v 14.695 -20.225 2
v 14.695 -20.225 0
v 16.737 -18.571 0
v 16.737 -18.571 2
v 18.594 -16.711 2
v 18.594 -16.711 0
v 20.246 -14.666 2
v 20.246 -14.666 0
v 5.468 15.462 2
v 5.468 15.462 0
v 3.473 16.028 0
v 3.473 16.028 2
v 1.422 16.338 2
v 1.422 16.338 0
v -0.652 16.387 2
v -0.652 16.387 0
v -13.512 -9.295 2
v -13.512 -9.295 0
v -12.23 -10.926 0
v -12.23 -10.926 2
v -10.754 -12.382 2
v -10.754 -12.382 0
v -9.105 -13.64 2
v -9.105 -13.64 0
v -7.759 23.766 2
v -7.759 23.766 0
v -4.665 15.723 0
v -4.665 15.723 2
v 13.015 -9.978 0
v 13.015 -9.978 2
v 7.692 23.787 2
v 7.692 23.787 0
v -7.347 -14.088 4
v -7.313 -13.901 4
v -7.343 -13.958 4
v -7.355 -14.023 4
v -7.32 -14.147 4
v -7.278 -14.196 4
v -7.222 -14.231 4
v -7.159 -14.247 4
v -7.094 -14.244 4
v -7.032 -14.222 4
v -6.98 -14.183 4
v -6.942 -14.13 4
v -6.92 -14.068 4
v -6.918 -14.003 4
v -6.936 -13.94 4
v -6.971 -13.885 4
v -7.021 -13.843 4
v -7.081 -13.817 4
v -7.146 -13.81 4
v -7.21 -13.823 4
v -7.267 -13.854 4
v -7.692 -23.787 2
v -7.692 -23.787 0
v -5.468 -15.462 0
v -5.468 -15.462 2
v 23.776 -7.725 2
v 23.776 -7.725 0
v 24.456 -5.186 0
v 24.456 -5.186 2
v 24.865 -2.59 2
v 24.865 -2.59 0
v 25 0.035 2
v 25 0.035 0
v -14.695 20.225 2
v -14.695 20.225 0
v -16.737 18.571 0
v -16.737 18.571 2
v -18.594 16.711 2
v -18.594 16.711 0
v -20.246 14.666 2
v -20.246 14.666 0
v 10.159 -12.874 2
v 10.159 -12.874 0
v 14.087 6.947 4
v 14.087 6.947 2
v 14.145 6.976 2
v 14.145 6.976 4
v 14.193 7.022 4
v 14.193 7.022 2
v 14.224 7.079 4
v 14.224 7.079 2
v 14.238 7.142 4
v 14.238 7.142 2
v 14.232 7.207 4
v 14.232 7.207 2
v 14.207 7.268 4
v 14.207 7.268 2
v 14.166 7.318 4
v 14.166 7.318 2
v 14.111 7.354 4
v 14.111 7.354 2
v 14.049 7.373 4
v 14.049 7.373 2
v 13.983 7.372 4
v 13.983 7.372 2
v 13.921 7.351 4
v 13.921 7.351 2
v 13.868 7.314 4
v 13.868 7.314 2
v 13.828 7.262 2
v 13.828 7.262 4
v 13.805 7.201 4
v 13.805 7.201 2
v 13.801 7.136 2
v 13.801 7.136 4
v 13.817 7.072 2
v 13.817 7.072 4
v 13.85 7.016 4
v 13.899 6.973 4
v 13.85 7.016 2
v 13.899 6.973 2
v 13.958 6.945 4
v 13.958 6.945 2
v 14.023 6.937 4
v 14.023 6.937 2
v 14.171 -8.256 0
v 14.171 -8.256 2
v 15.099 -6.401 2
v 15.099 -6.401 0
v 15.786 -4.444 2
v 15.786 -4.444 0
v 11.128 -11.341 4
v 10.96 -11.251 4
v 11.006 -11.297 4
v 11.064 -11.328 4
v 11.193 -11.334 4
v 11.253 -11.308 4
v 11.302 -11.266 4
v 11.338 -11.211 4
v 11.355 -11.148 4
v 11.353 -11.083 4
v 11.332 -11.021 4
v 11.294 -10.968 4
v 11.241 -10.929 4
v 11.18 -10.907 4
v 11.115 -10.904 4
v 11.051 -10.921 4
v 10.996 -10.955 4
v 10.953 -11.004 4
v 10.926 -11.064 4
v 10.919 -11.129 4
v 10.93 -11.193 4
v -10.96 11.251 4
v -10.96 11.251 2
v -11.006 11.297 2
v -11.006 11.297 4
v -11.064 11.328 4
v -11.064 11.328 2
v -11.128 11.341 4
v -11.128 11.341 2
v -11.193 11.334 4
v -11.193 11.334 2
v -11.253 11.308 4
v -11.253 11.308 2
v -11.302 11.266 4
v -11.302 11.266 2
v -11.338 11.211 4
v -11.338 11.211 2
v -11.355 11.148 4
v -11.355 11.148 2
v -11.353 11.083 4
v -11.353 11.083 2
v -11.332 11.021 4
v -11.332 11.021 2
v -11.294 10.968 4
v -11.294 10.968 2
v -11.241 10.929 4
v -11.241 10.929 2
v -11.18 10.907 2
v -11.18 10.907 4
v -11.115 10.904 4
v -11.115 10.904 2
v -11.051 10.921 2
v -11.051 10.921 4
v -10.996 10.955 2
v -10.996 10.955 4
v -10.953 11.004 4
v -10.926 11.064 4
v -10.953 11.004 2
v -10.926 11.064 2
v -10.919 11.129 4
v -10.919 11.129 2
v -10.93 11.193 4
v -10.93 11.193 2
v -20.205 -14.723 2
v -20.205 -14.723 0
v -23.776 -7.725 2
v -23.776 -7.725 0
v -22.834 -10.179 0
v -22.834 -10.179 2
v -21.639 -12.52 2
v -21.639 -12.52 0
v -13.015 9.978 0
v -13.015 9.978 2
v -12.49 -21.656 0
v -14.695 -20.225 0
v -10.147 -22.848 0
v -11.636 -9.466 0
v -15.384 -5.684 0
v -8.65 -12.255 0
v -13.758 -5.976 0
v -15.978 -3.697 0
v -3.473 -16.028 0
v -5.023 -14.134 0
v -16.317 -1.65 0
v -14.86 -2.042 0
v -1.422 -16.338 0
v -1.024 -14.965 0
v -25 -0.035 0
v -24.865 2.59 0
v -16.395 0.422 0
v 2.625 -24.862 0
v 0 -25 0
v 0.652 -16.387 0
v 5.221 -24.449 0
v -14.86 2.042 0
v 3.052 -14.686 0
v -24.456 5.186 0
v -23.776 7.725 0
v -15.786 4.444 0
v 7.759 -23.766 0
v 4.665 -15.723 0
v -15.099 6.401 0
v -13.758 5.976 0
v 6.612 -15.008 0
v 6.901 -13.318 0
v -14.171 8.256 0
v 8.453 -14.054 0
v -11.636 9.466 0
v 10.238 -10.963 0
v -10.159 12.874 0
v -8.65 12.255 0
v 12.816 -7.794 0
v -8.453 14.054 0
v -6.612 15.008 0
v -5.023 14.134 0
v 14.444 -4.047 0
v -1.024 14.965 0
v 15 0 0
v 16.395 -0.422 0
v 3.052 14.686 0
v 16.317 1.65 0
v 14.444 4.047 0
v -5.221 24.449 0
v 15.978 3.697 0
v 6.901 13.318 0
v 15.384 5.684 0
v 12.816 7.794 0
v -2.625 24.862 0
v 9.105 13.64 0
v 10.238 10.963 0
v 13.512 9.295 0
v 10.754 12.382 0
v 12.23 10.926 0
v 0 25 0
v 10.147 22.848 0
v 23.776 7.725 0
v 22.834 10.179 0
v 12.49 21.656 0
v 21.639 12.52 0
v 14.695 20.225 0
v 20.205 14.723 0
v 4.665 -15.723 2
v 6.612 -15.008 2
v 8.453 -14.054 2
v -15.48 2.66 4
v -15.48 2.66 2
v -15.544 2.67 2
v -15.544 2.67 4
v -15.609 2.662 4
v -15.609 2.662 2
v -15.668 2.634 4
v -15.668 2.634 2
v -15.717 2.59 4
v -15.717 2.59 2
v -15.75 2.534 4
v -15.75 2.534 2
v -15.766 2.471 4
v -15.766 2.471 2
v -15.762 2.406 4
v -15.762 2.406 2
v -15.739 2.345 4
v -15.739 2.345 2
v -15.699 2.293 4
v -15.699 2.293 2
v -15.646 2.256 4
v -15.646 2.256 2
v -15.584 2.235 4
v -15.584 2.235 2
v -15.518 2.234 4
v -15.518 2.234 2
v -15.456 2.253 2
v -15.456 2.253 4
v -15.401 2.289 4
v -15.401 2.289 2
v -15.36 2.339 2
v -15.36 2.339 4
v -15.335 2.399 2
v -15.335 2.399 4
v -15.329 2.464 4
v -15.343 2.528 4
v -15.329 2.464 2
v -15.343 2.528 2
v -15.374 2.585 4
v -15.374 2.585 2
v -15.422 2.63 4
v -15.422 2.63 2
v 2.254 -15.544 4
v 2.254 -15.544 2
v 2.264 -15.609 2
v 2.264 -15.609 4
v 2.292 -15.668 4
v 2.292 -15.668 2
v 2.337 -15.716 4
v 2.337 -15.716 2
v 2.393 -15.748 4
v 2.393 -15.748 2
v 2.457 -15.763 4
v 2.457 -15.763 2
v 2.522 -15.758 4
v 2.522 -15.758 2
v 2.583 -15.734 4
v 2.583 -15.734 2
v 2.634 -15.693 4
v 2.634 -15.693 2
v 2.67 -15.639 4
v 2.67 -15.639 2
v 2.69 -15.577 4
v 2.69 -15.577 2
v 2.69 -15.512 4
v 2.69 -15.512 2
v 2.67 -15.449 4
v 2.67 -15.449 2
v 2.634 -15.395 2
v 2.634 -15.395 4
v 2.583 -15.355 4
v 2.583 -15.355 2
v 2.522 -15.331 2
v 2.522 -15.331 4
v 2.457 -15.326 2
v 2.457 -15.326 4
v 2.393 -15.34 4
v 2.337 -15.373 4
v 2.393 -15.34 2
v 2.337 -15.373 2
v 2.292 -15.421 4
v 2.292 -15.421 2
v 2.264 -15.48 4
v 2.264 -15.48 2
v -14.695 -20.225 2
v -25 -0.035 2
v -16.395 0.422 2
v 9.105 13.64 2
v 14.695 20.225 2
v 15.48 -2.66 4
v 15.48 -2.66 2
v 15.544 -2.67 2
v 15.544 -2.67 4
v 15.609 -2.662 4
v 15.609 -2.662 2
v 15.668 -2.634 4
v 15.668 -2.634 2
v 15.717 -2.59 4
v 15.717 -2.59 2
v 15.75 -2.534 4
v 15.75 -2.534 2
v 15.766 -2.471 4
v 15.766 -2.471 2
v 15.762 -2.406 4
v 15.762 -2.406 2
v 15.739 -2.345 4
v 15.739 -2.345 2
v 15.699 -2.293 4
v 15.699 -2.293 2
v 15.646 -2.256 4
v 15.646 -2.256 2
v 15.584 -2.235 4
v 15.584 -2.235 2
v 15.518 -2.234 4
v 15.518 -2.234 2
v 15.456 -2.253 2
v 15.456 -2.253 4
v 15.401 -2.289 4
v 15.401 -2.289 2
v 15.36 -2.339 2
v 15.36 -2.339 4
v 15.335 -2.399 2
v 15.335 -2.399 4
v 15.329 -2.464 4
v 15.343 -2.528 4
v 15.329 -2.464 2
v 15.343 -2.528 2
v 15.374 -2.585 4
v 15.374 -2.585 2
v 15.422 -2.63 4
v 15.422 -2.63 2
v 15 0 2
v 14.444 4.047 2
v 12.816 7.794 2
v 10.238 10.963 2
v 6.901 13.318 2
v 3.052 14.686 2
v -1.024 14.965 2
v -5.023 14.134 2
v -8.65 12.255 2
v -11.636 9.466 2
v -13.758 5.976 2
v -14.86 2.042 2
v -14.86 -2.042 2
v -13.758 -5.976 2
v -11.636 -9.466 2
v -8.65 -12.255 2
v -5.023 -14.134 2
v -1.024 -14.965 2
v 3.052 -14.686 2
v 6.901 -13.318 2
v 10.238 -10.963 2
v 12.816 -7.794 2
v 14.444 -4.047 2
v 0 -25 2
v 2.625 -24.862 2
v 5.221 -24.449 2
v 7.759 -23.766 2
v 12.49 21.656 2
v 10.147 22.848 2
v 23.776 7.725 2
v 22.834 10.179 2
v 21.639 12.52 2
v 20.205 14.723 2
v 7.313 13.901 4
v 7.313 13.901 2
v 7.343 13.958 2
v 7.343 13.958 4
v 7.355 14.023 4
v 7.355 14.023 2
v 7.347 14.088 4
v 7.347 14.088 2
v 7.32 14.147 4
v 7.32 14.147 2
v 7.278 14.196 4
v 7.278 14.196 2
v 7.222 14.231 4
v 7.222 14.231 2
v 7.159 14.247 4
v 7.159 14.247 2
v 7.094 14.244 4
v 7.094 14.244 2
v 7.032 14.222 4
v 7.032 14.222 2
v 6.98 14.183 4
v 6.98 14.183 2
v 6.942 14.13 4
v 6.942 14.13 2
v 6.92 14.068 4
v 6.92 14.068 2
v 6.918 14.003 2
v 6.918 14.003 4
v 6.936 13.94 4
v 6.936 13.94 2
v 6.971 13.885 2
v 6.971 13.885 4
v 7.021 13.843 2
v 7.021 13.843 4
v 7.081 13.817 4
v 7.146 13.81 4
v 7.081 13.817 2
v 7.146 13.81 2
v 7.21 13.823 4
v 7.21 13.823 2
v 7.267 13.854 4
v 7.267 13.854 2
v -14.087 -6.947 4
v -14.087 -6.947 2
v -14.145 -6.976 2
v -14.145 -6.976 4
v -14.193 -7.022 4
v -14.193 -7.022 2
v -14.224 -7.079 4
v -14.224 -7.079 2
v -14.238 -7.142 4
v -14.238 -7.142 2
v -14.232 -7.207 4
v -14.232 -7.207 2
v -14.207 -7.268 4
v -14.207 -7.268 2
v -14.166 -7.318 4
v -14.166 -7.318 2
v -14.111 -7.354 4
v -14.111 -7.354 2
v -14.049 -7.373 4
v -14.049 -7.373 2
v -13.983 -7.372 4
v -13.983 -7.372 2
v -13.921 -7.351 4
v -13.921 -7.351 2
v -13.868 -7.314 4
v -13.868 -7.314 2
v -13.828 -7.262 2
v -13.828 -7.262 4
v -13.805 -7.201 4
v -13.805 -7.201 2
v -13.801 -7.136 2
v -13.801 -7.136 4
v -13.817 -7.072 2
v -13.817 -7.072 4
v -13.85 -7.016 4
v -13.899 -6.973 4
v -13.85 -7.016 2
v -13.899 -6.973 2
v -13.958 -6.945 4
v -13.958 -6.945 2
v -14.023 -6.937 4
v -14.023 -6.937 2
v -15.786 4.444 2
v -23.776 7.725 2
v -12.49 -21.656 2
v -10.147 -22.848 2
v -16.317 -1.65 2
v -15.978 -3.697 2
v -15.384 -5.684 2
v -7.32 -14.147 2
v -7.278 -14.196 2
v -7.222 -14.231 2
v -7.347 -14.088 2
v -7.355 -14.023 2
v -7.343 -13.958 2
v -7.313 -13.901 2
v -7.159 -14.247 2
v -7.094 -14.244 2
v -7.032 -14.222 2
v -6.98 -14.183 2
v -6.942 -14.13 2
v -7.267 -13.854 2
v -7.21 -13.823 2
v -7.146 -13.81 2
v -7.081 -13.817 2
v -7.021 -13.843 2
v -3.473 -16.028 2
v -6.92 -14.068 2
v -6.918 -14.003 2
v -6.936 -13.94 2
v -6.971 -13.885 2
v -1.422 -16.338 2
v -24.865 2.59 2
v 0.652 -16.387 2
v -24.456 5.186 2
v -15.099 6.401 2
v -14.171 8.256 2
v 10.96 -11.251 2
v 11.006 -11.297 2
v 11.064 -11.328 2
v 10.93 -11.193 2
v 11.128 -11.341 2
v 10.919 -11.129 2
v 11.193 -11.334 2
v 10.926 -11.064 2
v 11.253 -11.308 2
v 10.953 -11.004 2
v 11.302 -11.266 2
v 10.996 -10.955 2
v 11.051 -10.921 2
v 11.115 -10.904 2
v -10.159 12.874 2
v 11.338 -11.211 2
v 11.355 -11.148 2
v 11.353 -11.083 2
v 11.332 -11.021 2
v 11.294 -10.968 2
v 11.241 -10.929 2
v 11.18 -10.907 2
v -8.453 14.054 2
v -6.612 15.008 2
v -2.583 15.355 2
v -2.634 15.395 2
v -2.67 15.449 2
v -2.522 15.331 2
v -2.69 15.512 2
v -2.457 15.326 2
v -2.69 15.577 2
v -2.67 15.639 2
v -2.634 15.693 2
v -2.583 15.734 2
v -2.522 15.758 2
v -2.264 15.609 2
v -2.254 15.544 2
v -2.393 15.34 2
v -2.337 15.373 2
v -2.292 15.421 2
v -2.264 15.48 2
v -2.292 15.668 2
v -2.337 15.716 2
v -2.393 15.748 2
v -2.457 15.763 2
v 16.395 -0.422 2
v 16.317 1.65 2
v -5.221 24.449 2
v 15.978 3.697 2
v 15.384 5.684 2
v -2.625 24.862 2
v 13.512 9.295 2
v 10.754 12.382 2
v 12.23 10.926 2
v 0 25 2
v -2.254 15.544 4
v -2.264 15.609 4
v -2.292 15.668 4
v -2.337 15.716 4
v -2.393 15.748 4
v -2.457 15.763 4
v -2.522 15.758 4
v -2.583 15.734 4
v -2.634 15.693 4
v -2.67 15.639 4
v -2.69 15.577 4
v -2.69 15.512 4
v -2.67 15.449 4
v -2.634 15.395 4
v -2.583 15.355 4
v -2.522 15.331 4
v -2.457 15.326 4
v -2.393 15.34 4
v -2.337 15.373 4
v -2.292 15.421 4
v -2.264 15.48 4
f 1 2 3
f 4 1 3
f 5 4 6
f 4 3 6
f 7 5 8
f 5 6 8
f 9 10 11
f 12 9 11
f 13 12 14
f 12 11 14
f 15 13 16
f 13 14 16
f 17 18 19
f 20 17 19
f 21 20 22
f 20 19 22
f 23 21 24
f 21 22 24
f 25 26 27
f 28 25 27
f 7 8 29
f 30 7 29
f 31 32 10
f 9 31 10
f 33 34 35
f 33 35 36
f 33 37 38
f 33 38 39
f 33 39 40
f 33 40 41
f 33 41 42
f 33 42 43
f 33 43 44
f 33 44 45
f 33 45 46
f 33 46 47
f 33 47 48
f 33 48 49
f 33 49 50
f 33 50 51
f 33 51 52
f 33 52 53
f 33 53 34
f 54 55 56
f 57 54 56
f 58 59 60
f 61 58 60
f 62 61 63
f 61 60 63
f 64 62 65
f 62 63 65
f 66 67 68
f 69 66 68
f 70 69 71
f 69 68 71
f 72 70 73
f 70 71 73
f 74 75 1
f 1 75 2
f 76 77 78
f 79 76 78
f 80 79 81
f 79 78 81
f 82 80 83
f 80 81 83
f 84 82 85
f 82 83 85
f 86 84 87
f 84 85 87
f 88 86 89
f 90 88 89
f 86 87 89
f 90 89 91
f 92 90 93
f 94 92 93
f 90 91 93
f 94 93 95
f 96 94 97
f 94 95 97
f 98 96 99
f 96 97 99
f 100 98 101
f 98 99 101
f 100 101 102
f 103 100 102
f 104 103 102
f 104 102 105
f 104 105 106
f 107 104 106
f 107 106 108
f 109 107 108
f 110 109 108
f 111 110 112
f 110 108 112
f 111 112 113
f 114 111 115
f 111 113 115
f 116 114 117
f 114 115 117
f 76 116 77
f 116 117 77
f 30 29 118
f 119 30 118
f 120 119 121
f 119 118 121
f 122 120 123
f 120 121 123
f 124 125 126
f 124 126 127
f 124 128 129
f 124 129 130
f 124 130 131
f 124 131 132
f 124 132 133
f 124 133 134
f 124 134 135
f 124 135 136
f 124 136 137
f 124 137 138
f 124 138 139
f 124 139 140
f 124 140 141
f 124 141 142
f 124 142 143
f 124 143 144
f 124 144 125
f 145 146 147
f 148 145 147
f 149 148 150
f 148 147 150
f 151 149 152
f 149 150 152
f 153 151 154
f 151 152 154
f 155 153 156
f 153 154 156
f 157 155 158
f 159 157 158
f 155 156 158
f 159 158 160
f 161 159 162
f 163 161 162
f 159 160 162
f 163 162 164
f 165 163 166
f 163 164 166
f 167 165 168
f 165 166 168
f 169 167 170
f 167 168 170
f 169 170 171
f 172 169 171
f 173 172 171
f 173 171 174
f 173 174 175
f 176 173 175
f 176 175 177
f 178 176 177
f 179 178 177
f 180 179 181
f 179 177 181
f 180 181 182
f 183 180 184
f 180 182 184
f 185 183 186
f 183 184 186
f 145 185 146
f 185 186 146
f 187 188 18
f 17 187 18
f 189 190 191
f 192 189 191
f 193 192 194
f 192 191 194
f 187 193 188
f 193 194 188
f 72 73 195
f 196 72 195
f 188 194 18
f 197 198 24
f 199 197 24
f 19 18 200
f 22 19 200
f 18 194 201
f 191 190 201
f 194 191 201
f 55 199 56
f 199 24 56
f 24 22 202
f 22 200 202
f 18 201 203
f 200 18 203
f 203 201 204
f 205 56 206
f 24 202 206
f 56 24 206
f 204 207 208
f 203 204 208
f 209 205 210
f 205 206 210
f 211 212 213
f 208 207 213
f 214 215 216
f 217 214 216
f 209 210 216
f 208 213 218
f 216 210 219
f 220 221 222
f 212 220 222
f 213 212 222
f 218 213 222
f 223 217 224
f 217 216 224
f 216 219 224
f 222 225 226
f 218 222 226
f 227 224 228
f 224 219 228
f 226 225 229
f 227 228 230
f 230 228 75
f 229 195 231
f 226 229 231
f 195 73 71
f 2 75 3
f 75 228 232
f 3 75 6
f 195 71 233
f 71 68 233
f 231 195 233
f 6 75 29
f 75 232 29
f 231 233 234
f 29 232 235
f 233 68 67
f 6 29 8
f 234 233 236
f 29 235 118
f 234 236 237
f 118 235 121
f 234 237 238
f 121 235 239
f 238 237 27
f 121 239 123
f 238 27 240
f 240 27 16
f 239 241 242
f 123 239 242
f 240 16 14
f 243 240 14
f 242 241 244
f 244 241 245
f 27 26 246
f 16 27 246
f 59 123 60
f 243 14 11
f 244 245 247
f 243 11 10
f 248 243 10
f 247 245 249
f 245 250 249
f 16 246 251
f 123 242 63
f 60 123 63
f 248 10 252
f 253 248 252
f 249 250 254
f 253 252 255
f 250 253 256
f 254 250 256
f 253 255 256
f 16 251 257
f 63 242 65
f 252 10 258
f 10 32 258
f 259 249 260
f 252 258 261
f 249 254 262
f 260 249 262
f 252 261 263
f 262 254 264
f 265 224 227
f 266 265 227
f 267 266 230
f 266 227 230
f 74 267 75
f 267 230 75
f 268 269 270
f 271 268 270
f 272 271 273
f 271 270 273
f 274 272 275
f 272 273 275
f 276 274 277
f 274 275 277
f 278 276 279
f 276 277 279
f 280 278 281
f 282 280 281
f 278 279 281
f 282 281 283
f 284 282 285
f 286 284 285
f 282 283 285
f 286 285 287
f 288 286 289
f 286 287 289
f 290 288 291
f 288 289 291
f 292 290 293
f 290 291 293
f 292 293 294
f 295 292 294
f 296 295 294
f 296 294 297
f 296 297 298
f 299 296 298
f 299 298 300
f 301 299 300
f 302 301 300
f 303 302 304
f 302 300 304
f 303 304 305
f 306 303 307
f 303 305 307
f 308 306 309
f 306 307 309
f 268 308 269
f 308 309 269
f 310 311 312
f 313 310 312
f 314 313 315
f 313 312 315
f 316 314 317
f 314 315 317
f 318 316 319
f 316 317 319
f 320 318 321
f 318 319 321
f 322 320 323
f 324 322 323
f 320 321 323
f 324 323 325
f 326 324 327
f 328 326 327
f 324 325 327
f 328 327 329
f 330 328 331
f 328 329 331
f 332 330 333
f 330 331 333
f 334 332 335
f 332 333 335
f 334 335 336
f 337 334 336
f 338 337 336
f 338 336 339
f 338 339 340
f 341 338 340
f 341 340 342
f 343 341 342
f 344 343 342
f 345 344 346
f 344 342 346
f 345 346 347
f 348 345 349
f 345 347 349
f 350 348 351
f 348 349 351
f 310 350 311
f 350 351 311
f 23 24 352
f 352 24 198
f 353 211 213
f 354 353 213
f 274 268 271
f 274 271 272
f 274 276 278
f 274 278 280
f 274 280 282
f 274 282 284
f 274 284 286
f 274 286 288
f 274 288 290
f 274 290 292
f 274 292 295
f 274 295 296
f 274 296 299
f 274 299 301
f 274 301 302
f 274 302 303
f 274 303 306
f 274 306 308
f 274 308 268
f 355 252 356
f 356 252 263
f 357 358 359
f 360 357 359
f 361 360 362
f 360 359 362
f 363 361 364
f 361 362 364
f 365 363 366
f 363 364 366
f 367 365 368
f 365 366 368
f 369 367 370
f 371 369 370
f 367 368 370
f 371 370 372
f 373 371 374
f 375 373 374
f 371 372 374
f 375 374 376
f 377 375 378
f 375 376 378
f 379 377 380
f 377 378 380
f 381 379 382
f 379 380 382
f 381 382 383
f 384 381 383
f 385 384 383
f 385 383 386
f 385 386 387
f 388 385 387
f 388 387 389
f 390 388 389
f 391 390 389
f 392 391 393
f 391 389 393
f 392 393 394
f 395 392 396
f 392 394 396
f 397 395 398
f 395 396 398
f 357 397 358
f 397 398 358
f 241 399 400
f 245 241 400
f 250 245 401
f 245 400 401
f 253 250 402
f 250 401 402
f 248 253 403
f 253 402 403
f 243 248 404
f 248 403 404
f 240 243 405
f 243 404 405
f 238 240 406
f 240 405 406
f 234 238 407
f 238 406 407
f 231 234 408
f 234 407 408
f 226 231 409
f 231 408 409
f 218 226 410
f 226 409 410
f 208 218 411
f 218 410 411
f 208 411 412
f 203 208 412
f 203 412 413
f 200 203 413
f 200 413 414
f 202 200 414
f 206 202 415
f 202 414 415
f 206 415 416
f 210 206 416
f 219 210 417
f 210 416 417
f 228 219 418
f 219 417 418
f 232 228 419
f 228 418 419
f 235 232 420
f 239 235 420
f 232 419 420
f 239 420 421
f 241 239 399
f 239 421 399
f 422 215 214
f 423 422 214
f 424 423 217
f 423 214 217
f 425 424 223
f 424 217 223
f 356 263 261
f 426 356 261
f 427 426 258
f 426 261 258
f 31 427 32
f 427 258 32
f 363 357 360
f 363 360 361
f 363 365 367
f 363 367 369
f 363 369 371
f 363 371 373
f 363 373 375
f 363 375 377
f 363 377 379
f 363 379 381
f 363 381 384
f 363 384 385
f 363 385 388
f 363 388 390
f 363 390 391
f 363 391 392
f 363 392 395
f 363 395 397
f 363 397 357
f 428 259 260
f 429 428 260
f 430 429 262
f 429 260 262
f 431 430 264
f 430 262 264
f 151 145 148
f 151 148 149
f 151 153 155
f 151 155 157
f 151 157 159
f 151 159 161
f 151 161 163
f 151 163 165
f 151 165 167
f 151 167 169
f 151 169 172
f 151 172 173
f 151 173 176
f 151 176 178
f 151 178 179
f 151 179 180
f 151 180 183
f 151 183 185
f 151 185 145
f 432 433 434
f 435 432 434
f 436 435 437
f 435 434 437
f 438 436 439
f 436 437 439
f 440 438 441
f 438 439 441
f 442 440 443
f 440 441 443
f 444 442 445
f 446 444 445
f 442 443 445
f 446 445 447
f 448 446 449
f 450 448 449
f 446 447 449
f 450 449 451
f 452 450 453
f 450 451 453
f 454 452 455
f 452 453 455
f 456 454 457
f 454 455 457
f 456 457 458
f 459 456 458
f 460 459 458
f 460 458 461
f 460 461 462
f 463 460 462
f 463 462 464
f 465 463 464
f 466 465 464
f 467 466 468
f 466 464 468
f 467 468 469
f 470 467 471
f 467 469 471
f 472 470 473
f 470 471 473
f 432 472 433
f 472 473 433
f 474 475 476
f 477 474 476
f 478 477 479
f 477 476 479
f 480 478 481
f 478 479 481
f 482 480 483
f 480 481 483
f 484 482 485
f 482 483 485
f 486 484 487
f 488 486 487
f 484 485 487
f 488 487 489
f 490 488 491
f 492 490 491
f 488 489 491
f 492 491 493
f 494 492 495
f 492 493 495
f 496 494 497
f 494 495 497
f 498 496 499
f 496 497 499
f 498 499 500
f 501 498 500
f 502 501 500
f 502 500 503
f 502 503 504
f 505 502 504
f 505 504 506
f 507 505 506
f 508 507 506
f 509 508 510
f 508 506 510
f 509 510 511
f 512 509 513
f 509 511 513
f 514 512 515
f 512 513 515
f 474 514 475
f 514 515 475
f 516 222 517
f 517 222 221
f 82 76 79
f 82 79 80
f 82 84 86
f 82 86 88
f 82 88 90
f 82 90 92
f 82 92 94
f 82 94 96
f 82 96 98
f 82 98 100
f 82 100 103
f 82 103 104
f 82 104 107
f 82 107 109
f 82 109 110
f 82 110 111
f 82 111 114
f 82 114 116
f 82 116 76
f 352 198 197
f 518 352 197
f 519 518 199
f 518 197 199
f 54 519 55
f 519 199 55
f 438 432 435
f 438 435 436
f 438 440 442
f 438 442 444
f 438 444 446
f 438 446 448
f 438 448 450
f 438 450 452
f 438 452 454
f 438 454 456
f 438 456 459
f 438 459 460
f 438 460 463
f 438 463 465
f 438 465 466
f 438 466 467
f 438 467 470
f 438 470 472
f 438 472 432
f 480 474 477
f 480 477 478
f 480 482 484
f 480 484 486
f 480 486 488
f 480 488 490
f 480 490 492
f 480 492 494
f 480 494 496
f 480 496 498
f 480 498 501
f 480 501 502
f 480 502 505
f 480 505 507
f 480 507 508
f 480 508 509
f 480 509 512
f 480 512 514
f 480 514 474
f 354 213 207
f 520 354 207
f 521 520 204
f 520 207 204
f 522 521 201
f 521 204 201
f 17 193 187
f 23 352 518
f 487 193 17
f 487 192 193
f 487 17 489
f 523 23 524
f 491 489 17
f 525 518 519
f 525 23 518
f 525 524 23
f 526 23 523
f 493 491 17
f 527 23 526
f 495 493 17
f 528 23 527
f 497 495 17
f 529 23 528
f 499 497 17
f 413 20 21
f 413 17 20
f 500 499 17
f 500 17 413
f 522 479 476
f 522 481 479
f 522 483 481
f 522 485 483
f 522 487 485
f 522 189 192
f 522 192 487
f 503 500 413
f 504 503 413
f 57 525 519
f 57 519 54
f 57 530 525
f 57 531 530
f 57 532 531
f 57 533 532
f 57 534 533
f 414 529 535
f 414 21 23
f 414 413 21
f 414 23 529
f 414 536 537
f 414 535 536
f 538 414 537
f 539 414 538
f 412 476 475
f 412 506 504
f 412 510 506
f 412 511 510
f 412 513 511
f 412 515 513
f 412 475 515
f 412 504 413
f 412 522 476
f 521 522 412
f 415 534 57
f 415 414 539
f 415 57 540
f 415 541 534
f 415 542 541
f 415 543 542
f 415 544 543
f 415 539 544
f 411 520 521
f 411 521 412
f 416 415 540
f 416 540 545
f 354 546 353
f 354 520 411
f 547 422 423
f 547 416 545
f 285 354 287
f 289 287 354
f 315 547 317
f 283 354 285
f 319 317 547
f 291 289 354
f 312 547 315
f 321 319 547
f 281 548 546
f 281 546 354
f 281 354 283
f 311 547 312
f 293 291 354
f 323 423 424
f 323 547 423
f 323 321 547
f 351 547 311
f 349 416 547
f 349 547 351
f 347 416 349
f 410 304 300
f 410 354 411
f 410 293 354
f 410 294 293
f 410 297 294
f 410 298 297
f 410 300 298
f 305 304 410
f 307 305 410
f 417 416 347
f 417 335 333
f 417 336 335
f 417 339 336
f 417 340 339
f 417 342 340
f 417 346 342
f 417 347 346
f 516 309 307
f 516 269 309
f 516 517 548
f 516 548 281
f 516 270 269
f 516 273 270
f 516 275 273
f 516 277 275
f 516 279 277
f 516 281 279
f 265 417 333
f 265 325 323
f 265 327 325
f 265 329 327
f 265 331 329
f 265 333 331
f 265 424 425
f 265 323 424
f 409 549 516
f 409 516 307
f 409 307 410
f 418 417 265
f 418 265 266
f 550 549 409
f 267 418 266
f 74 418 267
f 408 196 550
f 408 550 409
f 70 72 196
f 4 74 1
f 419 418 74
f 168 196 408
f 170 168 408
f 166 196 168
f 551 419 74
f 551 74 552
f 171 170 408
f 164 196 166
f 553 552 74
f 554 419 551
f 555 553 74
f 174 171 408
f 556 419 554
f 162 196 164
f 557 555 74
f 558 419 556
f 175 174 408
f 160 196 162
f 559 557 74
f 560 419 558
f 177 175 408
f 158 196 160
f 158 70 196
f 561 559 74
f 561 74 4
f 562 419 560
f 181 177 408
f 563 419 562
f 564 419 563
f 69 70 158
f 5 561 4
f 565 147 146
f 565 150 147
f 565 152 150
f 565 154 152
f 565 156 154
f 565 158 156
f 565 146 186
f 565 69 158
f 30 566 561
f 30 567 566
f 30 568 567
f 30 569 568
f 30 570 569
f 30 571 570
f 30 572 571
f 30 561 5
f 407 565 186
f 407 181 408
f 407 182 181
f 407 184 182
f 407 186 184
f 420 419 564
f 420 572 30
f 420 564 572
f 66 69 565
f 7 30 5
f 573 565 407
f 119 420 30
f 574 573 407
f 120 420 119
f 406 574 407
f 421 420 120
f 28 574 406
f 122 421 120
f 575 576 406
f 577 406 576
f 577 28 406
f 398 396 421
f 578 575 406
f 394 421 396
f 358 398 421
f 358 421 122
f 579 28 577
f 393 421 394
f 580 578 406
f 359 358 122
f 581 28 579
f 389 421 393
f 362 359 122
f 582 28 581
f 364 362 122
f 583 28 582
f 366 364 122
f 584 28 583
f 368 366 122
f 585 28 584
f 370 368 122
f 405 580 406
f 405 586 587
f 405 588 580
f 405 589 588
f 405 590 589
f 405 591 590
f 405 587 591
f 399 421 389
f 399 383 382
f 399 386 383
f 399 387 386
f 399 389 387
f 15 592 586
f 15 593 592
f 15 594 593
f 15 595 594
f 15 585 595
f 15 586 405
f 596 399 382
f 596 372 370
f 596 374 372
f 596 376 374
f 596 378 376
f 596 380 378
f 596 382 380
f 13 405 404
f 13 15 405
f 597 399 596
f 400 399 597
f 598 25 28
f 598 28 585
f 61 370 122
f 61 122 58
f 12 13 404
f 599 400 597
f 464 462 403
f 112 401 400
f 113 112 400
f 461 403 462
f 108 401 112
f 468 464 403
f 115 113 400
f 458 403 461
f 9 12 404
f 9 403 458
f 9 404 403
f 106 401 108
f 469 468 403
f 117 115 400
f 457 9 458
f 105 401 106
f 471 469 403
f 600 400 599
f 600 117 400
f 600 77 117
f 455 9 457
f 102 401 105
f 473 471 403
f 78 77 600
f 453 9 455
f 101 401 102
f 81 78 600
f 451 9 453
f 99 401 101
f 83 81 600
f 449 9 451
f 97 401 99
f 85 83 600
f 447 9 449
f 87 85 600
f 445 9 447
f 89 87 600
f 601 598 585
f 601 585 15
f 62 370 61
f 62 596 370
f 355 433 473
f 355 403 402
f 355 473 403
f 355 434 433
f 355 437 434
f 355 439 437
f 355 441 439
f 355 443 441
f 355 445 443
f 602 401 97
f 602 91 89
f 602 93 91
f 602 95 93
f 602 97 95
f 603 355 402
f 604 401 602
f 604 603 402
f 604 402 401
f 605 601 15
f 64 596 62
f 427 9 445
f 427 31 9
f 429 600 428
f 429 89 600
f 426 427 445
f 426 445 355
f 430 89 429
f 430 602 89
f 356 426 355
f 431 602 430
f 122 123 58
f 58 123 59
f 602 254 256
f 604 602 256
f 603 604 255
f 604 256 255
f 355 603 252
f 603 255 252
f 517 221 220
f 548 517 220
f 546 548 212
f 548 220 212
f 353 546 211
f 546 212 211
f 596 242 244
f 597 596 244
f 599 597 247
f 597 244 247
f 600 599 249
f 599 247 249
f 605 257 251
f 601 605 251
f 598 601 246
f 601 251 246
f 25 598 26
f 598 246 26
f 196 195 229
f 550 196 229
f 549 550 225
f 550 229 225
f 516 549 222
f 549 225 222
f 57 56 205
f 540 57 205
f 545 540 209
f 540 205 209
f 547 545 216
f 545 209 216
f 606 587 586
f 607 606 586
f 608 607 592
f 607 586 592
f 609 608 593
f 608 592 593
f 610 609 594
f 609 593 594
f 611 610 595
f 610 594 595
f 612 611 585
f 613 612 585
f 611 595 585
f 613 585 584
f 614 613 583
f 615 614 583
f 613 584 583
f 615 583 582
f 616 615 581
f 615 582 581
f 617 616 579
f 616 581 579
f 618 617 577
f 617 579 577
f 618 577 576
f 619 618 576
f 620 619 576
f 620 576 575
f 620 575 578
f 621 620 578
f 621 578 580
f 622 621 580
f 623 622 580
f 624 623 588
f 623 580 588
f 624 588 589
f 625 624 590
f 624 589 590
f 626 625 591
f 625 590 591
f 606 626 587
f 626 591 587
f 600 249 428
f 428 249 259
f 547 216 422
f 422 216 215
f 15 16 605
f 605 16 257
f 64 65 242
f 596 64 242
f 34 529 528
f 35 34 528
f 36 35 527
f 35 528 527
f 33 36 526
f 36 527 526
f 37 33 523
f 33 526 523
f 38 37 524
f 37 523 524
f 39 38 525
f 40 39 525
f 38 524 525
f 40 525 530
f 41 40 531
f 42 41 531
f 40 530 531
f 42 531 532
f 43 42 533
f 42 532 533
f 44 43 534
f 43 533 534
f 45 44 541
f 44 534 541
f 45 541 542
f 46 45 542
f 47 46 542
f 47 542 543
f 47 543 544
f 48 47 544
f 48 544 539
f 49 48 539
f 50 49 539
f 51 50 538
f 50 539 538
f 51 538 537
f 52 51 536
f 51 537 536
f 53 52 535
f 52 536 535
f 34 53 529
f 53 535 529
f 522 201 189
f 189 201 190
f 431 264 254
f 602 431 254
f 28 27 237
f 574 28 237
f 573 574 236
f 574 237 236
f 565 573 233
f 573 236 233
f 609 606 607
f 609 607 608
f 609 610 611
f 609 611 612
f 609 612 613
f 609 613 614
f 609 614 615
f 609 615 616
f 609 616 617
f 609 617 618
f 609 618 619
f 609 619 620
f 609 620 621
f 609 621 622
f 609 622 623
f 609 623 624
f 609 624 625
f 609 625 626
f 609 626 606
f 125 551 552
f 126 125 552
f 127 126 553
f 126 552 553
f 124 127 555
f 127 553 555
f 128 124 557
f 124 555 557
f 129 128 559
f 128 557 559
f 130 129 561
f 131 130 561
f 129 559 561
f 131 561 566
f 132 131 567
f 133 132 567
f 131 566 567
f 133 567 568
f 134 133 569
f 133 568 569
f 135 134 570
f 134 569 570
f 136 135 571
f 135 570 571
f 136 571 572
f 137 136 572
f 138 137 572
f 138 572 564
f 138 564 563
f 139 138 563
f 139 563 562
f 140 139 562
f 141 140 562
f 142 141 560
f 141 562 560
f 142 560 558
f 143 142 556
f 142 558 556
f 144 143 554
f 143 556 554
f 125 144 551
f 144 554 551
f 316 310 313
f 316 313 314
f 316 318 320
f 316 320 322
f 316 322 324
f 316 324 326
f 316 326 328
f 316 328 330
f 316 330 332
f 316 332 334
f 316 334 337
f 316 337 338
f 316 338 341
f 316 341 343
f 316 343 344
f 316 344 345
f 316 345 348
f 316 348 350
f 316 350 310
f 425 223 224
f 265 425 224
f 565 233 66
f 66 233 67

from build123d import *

# Parameters (mm, degrees)
SKETCH1_R            = 16.4
BOSS_EXTRUDE7_DEPTH  = 2
BOSS_EXTRUDE9_DEPTH  = 2
CIRPATTERN3_COUNT    = 10
SKETCH8_R            = 15
CUT_EXTRUDE6_DEPTH   = 2
SKETCH9_R            = 0.219012447
BOSS_EXTRUDE10_DEPTH = 2
CIRPATTERN4_COUNT    = 10


with BuildPart() as part:
    # Sketch1 → Boss-Extrude7 (new body)
    with BuildSketch(Plane.XY):
        Circle(SKETCH1_R)
    boss_extrude7 = extrude(amount=BOSS_EXTRUDE7_DEPTH)

    # Sketch7 → Boss-Extrude9 (add)
    with BuildSketch(Plane(origin=(0, 0, 0), x_dir=(-1, 0, 0), z_dir=(0, 0, -1))):
        with BuildLine():
            Line((7.758615453, 23.765603006), (4.664676273, 15.722620496))
            ThreePointArc((4.664676273, 15.722620496), (2.678892521, 16.179726044), (0.651751249, 16.387044282))
            Line((0.651751249, 16.387044282), (0, 25))
            ThreePointArc((0, 25), (3.928099085, 24.689472201), (7.758615453, 23.765603006))
        make_face()
    boss_extrude9 = extrude(amount=-BOSS_EXTRUDE9_DEPTH)

    # CirPattern3: Boss-Extrude7, Boss-Extrude9 ×10 about axis
    cirpattern3_axis = Axis((0, 0, 0), (0, 0, 1))
    add([boss_extrude7.rotate(cirpattern3_axis, i * 360 / CIRPATTERN3_COUNT) for i in range(1, CIRPATTERN3_COUNT)])
    add([boss_extrude9.rotate(cirpattern3_axis, i * 360 / CIRPATTERN3_COUNT) for i in range(1, CIRPATTERN3_COUNT)])

    # Sketch8 → Cut-Extrude6 (cut)
    with BuildSketch(Plane.XY.offset(2)):
        Circle(SKETCH8_R)
    extrude(amount=-CUT_EXTRUDE6_DEPTH, mode=Mode.SUBTRACT)

    # Sketch9 → Boss-Extrude10 (add)
    with BuildSketch(Plane.XY.offset(2)):
        with Locations((-2.473101921, 15.544307771)):
            Circle(SKETCH9_R)
    boss_extrude10 = extrude(amount=BOSS_EXTRUDE10_DEPTH)

    # CirPattern4: Boss-Extrude10 ×10 about axis
    cirpattern4_axis = Axis((0, 0, 0), (0, 0, 1))
    for i in range(1, CIRPATTERN4_COUNT):
        add(boss_extrude10.rotate(cirpattern4_axis, i * 360 / CIRPATTERN4_COUNT))


solid = part.part
